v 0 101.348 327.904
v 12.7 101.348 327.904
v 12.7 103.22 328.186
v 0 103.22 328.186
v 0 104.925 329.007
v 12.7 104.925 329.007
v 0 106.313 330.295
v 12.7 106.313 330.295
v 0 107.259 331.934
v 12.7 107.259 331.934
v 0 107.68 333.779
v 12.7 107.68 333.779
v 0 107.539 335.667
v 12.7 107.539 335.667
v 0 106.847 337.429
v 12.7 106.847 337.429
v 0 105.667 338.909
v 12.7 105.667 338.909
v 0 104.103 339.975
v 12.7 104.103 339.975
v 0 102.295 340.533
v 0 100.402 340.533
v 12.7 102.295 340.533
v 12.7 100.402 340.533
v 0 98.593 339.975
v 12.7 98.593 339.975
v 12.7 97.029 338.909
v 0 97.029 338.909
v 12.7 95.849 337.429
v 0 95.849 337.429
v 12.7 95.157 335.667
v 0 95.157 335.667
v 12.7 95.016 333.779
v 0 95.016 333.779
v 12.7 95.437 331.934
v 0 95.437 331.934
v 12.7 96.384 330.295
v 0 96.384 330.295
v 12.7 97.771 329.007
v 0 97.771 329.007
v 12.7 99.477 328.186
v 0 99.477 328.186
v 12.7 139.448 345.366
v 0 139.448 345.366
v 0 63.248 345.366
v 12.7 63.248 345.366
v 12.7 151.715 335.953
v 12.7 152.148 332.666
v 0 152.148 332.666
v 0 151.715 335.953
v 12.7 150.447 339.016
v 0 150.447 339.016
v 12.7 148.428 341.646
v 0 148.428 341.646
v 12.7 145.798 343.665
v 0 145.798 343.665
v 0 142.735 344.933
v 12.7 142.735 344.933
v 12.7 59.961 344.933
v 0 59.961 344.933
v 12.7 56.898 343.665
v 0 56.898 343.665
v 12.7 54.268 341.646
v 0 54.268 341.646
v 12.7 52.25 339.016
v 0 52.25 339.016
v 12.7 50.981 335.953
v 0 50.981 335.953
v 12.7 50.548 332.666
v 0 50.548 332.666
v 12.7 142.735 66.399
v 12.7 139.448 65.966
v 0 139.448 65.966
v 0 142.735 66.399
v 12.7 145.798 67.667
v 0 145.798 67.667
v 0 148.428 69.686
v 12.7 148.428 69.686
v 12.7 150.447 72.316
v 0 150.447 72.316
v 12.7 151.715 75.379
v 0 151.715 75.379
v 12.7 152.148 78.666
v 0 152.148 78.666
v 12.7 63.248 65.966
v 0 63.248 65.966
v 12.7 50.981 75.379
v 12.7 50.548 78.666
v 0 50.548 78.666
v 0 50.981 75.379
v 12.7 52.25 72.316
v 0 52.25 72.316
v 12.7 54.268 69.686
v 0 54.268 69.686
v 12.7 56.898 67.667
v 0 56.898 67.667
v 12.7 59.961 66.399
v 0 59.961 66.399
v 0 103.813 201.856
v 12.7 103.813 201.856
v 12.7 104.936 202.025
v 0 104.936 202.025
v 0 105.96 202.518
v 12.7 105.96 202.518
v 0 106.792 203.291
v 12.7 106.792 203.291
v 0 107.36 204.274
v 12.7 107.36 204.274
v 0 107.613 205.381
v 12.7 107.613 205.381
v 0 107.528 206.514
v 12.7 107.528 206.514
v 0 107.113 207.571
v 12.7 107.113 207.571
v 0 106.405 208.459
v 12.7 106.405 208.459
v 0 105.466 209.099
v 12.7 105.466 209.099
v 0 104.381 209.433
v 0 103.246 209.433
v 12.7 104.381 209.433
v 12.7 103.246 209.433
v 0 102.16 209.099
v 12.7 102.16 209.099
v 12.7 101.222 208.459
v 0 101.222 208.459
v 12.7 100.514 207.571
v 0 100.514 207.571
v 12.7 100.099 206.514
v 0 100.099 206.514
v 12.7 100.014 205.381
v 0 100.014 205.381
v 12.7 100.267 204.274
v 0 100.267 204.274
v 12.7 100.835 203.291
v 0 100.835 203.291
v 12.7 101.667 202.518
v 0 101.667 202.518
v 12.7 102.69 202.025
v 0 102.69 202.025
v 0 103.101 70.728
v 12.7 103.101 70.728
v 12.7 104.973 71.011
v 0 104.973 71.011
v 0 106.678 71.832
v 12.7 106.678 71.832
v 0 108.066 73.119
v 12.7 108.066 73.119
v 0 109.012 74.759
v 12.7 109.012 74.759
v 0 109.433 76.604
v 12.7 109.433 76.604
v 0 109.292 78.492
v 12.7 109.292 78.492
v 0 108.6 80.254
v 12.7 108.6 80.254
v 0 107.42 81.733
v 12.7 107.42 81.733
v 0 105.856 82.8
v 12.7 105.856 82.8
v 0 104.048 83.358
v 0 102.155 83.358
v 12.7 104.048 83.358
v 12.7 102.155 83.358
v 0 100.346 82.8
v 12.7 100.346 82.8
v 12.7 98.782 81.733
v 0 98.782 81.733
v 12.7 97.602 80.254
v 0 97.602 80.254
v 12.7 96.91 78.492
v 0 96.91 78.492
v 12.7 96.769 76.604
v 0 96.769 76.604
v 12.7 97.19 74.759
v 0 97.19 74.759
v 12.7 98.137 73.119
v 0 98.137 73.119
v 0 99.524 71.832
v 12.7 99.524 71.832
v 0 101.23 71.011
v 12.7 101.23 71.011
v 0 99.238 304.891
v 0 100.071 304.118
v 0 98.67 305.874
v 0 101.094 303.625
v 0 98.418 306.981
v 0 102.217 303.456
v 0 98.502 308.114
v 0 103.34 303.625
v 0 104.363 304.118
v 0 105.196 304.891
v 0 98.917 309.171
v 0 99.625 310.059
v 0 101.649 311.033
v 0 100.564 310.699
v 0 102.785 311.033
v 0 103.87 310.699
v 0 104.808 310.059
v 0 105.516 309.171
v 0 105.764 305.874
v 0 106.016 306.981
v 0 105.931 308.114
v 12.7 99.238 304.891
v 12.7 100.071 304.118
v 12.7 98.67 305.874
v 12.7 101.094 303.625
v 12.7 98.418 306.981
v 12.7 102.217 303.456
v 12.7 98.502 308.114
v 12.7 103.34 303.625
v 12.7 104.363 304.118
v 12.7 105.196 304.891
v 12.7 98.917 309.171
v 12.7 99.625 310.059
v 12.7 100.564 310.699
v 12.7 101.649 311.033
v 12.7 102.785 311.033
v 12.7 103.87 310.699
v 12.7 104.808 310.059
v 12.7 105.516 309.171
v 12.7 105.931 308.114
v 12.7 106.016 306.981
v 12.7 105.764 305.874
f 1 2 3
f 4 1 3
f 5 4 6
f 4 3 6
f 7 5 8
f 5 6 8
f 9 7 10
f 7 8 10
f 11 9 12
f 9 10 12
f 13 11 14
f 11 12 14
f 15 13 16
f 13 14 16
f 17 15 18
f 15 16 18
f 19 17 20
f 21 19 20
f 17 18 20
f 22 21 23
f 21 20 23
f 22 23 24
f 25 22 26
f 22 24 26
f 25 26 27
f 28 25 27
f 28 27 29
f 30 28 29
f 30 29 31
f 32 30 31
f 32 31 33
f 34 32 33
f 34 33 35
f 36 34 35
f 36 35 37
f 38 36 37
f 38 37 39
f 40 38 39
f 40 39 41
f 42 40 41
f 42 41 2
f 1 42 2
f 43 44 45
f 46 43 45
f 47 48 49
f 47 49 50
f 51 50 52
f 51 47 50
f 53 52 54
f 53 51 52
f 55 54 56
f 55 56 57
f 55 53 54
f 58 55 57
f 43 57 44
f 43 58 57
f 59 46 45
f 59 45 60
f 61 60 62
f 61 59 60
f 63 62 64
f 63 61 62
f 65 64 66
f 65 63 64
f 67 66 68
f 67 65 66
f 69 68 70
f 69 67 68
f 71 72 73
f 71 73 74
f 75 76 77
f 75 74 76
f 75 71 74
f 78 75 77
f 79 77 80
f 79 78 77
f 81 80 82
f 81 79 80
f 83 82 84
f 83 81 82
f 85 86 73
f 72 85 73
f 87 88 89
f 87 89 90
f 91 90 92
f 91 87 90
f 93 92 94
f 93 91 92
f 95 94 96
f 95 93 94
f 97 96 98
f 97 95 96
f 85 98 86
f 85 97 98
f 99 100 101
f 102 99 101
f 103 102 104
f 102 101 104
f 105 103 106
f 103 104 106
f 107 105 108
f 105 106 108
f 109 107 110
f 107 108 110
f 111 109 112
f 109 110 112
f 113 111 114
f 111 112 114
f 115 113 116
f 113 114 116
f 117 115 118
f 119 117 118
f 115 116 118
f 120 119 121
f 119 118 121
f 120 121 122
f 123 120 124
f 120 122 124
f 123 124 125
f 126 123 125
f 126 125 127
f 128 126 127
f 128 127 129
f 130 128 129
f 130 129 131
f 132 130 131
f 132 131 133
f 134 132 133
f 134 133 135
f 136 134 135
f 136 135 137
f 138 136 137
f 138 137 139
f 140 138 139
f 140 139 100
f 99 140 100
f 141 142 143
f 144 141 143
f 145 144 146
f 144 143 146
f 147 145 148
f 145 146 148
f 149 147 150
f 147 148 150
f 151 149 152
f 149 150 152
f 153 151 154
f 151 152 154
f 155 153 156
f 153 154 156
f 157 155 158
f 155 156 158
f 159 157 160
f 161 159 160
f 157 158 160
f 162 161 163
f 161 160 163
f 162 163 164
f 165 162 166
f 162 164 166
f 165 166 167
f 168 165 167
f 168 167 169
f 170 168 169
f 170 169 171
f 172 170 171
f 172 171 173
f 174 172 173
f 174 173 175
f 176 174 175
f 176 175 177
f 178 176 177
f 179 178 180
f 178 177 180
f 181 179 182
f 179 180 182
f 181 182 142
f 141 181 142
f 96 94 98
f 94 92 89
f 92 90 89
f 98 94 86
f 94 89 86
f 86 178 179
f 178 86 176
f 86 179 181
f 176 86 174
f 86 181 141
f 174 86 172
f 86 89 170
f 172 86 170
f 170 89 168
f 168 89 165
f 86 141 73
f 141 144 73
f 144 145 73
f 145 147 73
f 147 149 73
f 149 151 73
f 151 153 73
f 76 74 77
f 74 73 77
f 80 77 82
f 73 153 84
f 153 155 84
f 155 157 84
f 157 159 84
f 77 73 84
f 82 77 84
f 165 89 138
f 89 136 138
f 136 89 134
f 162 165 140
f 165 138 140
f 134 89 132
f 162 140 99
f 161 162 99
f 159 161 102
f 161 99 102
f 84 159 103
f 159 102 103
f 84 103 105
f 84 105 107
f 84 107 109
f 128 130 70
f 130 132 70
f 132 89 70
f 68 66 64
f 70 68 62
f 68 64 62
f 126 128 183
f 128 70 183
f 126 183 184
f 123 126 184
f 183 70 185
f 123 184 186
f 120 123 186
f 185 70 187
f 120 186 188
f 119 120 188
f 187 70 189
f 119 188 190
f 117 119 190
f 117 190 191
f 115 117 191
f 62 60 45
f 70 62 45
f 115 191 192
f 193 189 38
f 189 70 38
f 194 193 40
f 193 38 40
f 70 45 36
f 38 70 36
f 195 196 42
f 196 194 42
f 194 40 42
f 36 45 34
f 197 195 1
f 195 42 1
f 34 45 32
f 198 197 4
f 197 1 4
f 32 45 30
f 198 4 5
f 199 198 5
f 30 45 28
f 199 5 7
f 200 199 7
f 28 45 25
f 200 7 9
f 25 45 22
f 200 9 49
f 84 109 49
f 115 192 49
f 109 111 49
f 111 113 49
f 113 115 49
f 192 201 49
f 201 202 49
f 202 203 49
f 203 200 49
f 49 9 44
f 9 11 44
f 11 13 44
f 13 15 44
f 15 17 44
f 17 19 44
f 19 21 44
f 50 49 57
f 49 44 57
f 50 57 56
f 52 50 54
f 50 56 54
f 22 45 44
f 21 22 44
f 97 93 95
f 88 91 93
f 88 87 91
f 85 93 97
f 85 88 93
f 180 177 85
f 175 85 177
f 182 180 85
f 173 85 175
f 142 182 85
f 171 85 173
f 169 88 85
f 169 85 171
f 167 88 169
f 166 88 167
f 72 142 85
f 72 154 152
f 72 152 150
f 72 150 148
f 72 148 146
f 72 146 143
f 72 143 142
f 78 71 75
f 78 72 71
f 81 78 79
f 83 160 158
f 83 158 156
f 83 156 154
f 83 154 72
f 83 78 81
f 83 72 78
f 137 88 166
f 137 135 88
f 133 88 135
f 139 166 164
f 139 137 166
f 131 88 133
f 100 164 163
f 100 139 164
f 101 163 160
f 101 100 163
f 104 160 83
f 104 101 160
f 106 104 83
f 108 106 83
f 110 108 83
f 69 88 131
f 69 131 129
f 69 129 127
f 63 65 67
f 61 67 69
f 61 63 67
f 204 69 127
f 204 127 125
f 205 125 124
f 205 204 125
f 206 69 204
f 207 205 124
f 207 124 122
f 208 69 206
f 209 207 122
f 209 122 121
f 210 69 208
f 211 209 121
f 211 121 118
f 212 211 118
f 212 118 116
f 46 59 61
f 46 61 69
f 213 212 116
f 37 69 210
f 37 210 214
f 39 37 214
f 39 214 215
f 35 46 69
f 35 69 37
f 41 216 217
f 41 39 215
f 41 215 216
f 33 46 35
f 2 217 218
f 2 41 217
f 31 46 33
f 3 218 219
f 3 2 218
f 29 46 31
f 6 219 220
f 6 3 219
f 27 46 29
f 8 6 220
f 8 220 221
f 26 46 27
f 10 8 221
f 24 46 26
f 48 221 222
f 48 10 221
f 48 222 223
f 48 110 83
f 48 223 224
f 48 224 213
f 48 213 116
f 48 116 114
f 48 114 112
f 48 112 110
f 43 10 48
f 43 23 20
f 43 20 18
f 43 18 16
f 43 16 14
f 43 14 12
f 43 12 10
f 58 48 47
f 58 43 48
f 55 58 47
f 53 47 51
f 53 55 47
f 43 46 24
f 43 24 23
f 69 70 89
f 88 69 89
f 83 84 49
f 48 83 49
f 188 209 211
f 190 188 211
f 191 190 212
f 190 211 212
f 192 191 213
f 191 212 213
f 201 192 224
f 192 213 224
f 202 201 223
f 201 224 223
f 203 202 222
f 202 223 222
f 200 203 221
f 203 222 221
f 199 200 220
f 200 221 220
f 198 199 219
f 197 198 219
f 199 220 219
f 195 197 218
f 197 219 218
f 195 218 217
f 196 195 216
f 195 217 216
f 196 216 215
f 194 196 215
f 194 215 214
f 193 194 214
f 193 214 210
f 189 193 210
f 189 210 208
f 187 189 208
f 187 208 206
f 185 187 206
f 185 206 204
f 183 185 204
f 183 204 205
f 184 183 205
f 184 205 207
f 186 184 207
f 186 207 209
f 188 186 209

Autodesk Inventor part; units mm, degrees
ref_plane "YZ Plane" through (0, 0, 0) normal (1, 0, 0) x (0, 1, 0)
ref_plane "XZ Plane" through (0, 0, 0) normal (0, 1, 0) x (-1, 0, 0)
ref_plane "XY Plane" through (0, 0, 0) normal (0, 0, 1) x (1, 0, 0)
sketch "Sketch1" plane through (0, 0, 0) normal (1, 0, 0) x (0, 1, 0)
  line L0 (152.1482, 345.366) -> (50.5482, 345.366)
  line L1 (50.5482, 345.366) -> (50.5482, 65.966)
  line L2 (50.5482, 65.966) -> (152.1482, 65.966)
  line L3 (152.1482, 65.966) -> (152.1482, 345.366)
  point P0 (0, 0)
  dimension "d0" = 279.4
  dimension "d1" = 101.6
extrude "Extrusion1" add sketch "Sketch1" along normal blind 12.7
fillet "Fillet1" radius 12.7 4 edges at (6.35, 152.1482, 345.366) (6.35, 152.1482, 65.966) (6.35, 50.5482, 345.366) (6.35, 50.5482, 65.966)
sketch "Sketch2" plane through (12.7, 0, 0) normal (1, 0, 0) x (0, 0, -1)
  line L0 (-345.366, 139.4482) -> (-345.366, 63.2482) projected
  line L1 (-345.366, 101.3482) -> (-65.966, 101.3482)
  line L2 (-65.966, 63.2482) -> (-65.966, 139.4482) projected
  line L3 (-345.366, 152.1482) -> (-334.254, 152.0486)
  arc A0 (-332.666, 152.1482) -> (-345.366, 139.4482) centre (-332.666, 139.4482) ccw projected
  line L4 (-334.254, 152.0486) -> (-334.254, 101.3482)
  circle A1 centre (-334.254, 101.3482) radius 6.35
  point P0 (0, 0)
  dimension "d5" = 11.1125
  dimension "d6" = 12.7
extrude "Extrusion2" cut sketch "Sketch2" against normal blind 42.8625 contours A1 L4 L1 | L1 A1 | A1 L1 L4
sketch "Sketch3" plane through (12.7, 0, 0) normal (1, 0, 0) x (0, 0, -1)
  line L0 (-345.366, 152.1482) -> (-307.266, 152.1482)
  line L1 (-78.666, 152.1482) -> (-332.666, 152.1482) projected
  line L2 (-307.266, 152.1482) -> (-307.266, 102.2169)
  circle A0 centre (-307.266, 102.2169) radius 3.81
  point P0 (0, 0)
  dimension "d9" = 38.1
  dimension "d10" = 7.62
extrude "Extrusion3" cut sketch "Sketch3" against normal blind 88.9
sketch "Sketch4" plane through (12.7, 0, 0) normal (1, 0, 0) x (0, 0, -1)
  line L0 (-65.966, 63.2482) -> (-65.966, 139.4482) projected
  line L1 (-65.966, 103.1393) -> (-299.4746, 103.1393)
  point P0 (0, 0)
sketch "Sketch5" plane through (12.7, 0, 0) normal (1, 0, 0) x (0, 0, -1)
  line L0 (-345.366, 152.1482) -> (-205.666, 152.1482)
  line L1 (-78.666, 152.1482) -> (-332.666, 152.1482) projected
  line L2 (-205.666, 103.8134) -> (-205.666, 152.1482)
  circle A0 centre (-205.666, 103.8134) radius 3.81
  point P0 (0, 0)
  dimension "d13" = 7.62
extrude "Extrusion4" cut sketch "Sketch5" against normal blind 214.3125
sketch "Sketch6" plane through (12.7, 0, 0) normal (1, 0, 0) x (0, 0, -1)
  line L0 (-65.966, 152.1482) -> (-77.0785, 152.1482)
  line L1 (-78.666, 152.1482) -> (-332.666, 152.1482) projected
  line L2 (-77.0785, 152.1482) -> (-77.0785, 103.1012)
  circle A0 centre (-77.0785, 103.1012) radius 6.35
  point P0 (0, 0)
  dimension "d16" = 11.1125
  dimension "d17" = 12.7
extrude "Extrusion5" cut sketch "Sketch6" against normal blind 211.1375
sketch "Sketch7" plane through (12.7, 0, 0) normal (1, 0, 0) x (0, 0, -1)
  point P0 (0, 0)
properties part number "Base Plate."
